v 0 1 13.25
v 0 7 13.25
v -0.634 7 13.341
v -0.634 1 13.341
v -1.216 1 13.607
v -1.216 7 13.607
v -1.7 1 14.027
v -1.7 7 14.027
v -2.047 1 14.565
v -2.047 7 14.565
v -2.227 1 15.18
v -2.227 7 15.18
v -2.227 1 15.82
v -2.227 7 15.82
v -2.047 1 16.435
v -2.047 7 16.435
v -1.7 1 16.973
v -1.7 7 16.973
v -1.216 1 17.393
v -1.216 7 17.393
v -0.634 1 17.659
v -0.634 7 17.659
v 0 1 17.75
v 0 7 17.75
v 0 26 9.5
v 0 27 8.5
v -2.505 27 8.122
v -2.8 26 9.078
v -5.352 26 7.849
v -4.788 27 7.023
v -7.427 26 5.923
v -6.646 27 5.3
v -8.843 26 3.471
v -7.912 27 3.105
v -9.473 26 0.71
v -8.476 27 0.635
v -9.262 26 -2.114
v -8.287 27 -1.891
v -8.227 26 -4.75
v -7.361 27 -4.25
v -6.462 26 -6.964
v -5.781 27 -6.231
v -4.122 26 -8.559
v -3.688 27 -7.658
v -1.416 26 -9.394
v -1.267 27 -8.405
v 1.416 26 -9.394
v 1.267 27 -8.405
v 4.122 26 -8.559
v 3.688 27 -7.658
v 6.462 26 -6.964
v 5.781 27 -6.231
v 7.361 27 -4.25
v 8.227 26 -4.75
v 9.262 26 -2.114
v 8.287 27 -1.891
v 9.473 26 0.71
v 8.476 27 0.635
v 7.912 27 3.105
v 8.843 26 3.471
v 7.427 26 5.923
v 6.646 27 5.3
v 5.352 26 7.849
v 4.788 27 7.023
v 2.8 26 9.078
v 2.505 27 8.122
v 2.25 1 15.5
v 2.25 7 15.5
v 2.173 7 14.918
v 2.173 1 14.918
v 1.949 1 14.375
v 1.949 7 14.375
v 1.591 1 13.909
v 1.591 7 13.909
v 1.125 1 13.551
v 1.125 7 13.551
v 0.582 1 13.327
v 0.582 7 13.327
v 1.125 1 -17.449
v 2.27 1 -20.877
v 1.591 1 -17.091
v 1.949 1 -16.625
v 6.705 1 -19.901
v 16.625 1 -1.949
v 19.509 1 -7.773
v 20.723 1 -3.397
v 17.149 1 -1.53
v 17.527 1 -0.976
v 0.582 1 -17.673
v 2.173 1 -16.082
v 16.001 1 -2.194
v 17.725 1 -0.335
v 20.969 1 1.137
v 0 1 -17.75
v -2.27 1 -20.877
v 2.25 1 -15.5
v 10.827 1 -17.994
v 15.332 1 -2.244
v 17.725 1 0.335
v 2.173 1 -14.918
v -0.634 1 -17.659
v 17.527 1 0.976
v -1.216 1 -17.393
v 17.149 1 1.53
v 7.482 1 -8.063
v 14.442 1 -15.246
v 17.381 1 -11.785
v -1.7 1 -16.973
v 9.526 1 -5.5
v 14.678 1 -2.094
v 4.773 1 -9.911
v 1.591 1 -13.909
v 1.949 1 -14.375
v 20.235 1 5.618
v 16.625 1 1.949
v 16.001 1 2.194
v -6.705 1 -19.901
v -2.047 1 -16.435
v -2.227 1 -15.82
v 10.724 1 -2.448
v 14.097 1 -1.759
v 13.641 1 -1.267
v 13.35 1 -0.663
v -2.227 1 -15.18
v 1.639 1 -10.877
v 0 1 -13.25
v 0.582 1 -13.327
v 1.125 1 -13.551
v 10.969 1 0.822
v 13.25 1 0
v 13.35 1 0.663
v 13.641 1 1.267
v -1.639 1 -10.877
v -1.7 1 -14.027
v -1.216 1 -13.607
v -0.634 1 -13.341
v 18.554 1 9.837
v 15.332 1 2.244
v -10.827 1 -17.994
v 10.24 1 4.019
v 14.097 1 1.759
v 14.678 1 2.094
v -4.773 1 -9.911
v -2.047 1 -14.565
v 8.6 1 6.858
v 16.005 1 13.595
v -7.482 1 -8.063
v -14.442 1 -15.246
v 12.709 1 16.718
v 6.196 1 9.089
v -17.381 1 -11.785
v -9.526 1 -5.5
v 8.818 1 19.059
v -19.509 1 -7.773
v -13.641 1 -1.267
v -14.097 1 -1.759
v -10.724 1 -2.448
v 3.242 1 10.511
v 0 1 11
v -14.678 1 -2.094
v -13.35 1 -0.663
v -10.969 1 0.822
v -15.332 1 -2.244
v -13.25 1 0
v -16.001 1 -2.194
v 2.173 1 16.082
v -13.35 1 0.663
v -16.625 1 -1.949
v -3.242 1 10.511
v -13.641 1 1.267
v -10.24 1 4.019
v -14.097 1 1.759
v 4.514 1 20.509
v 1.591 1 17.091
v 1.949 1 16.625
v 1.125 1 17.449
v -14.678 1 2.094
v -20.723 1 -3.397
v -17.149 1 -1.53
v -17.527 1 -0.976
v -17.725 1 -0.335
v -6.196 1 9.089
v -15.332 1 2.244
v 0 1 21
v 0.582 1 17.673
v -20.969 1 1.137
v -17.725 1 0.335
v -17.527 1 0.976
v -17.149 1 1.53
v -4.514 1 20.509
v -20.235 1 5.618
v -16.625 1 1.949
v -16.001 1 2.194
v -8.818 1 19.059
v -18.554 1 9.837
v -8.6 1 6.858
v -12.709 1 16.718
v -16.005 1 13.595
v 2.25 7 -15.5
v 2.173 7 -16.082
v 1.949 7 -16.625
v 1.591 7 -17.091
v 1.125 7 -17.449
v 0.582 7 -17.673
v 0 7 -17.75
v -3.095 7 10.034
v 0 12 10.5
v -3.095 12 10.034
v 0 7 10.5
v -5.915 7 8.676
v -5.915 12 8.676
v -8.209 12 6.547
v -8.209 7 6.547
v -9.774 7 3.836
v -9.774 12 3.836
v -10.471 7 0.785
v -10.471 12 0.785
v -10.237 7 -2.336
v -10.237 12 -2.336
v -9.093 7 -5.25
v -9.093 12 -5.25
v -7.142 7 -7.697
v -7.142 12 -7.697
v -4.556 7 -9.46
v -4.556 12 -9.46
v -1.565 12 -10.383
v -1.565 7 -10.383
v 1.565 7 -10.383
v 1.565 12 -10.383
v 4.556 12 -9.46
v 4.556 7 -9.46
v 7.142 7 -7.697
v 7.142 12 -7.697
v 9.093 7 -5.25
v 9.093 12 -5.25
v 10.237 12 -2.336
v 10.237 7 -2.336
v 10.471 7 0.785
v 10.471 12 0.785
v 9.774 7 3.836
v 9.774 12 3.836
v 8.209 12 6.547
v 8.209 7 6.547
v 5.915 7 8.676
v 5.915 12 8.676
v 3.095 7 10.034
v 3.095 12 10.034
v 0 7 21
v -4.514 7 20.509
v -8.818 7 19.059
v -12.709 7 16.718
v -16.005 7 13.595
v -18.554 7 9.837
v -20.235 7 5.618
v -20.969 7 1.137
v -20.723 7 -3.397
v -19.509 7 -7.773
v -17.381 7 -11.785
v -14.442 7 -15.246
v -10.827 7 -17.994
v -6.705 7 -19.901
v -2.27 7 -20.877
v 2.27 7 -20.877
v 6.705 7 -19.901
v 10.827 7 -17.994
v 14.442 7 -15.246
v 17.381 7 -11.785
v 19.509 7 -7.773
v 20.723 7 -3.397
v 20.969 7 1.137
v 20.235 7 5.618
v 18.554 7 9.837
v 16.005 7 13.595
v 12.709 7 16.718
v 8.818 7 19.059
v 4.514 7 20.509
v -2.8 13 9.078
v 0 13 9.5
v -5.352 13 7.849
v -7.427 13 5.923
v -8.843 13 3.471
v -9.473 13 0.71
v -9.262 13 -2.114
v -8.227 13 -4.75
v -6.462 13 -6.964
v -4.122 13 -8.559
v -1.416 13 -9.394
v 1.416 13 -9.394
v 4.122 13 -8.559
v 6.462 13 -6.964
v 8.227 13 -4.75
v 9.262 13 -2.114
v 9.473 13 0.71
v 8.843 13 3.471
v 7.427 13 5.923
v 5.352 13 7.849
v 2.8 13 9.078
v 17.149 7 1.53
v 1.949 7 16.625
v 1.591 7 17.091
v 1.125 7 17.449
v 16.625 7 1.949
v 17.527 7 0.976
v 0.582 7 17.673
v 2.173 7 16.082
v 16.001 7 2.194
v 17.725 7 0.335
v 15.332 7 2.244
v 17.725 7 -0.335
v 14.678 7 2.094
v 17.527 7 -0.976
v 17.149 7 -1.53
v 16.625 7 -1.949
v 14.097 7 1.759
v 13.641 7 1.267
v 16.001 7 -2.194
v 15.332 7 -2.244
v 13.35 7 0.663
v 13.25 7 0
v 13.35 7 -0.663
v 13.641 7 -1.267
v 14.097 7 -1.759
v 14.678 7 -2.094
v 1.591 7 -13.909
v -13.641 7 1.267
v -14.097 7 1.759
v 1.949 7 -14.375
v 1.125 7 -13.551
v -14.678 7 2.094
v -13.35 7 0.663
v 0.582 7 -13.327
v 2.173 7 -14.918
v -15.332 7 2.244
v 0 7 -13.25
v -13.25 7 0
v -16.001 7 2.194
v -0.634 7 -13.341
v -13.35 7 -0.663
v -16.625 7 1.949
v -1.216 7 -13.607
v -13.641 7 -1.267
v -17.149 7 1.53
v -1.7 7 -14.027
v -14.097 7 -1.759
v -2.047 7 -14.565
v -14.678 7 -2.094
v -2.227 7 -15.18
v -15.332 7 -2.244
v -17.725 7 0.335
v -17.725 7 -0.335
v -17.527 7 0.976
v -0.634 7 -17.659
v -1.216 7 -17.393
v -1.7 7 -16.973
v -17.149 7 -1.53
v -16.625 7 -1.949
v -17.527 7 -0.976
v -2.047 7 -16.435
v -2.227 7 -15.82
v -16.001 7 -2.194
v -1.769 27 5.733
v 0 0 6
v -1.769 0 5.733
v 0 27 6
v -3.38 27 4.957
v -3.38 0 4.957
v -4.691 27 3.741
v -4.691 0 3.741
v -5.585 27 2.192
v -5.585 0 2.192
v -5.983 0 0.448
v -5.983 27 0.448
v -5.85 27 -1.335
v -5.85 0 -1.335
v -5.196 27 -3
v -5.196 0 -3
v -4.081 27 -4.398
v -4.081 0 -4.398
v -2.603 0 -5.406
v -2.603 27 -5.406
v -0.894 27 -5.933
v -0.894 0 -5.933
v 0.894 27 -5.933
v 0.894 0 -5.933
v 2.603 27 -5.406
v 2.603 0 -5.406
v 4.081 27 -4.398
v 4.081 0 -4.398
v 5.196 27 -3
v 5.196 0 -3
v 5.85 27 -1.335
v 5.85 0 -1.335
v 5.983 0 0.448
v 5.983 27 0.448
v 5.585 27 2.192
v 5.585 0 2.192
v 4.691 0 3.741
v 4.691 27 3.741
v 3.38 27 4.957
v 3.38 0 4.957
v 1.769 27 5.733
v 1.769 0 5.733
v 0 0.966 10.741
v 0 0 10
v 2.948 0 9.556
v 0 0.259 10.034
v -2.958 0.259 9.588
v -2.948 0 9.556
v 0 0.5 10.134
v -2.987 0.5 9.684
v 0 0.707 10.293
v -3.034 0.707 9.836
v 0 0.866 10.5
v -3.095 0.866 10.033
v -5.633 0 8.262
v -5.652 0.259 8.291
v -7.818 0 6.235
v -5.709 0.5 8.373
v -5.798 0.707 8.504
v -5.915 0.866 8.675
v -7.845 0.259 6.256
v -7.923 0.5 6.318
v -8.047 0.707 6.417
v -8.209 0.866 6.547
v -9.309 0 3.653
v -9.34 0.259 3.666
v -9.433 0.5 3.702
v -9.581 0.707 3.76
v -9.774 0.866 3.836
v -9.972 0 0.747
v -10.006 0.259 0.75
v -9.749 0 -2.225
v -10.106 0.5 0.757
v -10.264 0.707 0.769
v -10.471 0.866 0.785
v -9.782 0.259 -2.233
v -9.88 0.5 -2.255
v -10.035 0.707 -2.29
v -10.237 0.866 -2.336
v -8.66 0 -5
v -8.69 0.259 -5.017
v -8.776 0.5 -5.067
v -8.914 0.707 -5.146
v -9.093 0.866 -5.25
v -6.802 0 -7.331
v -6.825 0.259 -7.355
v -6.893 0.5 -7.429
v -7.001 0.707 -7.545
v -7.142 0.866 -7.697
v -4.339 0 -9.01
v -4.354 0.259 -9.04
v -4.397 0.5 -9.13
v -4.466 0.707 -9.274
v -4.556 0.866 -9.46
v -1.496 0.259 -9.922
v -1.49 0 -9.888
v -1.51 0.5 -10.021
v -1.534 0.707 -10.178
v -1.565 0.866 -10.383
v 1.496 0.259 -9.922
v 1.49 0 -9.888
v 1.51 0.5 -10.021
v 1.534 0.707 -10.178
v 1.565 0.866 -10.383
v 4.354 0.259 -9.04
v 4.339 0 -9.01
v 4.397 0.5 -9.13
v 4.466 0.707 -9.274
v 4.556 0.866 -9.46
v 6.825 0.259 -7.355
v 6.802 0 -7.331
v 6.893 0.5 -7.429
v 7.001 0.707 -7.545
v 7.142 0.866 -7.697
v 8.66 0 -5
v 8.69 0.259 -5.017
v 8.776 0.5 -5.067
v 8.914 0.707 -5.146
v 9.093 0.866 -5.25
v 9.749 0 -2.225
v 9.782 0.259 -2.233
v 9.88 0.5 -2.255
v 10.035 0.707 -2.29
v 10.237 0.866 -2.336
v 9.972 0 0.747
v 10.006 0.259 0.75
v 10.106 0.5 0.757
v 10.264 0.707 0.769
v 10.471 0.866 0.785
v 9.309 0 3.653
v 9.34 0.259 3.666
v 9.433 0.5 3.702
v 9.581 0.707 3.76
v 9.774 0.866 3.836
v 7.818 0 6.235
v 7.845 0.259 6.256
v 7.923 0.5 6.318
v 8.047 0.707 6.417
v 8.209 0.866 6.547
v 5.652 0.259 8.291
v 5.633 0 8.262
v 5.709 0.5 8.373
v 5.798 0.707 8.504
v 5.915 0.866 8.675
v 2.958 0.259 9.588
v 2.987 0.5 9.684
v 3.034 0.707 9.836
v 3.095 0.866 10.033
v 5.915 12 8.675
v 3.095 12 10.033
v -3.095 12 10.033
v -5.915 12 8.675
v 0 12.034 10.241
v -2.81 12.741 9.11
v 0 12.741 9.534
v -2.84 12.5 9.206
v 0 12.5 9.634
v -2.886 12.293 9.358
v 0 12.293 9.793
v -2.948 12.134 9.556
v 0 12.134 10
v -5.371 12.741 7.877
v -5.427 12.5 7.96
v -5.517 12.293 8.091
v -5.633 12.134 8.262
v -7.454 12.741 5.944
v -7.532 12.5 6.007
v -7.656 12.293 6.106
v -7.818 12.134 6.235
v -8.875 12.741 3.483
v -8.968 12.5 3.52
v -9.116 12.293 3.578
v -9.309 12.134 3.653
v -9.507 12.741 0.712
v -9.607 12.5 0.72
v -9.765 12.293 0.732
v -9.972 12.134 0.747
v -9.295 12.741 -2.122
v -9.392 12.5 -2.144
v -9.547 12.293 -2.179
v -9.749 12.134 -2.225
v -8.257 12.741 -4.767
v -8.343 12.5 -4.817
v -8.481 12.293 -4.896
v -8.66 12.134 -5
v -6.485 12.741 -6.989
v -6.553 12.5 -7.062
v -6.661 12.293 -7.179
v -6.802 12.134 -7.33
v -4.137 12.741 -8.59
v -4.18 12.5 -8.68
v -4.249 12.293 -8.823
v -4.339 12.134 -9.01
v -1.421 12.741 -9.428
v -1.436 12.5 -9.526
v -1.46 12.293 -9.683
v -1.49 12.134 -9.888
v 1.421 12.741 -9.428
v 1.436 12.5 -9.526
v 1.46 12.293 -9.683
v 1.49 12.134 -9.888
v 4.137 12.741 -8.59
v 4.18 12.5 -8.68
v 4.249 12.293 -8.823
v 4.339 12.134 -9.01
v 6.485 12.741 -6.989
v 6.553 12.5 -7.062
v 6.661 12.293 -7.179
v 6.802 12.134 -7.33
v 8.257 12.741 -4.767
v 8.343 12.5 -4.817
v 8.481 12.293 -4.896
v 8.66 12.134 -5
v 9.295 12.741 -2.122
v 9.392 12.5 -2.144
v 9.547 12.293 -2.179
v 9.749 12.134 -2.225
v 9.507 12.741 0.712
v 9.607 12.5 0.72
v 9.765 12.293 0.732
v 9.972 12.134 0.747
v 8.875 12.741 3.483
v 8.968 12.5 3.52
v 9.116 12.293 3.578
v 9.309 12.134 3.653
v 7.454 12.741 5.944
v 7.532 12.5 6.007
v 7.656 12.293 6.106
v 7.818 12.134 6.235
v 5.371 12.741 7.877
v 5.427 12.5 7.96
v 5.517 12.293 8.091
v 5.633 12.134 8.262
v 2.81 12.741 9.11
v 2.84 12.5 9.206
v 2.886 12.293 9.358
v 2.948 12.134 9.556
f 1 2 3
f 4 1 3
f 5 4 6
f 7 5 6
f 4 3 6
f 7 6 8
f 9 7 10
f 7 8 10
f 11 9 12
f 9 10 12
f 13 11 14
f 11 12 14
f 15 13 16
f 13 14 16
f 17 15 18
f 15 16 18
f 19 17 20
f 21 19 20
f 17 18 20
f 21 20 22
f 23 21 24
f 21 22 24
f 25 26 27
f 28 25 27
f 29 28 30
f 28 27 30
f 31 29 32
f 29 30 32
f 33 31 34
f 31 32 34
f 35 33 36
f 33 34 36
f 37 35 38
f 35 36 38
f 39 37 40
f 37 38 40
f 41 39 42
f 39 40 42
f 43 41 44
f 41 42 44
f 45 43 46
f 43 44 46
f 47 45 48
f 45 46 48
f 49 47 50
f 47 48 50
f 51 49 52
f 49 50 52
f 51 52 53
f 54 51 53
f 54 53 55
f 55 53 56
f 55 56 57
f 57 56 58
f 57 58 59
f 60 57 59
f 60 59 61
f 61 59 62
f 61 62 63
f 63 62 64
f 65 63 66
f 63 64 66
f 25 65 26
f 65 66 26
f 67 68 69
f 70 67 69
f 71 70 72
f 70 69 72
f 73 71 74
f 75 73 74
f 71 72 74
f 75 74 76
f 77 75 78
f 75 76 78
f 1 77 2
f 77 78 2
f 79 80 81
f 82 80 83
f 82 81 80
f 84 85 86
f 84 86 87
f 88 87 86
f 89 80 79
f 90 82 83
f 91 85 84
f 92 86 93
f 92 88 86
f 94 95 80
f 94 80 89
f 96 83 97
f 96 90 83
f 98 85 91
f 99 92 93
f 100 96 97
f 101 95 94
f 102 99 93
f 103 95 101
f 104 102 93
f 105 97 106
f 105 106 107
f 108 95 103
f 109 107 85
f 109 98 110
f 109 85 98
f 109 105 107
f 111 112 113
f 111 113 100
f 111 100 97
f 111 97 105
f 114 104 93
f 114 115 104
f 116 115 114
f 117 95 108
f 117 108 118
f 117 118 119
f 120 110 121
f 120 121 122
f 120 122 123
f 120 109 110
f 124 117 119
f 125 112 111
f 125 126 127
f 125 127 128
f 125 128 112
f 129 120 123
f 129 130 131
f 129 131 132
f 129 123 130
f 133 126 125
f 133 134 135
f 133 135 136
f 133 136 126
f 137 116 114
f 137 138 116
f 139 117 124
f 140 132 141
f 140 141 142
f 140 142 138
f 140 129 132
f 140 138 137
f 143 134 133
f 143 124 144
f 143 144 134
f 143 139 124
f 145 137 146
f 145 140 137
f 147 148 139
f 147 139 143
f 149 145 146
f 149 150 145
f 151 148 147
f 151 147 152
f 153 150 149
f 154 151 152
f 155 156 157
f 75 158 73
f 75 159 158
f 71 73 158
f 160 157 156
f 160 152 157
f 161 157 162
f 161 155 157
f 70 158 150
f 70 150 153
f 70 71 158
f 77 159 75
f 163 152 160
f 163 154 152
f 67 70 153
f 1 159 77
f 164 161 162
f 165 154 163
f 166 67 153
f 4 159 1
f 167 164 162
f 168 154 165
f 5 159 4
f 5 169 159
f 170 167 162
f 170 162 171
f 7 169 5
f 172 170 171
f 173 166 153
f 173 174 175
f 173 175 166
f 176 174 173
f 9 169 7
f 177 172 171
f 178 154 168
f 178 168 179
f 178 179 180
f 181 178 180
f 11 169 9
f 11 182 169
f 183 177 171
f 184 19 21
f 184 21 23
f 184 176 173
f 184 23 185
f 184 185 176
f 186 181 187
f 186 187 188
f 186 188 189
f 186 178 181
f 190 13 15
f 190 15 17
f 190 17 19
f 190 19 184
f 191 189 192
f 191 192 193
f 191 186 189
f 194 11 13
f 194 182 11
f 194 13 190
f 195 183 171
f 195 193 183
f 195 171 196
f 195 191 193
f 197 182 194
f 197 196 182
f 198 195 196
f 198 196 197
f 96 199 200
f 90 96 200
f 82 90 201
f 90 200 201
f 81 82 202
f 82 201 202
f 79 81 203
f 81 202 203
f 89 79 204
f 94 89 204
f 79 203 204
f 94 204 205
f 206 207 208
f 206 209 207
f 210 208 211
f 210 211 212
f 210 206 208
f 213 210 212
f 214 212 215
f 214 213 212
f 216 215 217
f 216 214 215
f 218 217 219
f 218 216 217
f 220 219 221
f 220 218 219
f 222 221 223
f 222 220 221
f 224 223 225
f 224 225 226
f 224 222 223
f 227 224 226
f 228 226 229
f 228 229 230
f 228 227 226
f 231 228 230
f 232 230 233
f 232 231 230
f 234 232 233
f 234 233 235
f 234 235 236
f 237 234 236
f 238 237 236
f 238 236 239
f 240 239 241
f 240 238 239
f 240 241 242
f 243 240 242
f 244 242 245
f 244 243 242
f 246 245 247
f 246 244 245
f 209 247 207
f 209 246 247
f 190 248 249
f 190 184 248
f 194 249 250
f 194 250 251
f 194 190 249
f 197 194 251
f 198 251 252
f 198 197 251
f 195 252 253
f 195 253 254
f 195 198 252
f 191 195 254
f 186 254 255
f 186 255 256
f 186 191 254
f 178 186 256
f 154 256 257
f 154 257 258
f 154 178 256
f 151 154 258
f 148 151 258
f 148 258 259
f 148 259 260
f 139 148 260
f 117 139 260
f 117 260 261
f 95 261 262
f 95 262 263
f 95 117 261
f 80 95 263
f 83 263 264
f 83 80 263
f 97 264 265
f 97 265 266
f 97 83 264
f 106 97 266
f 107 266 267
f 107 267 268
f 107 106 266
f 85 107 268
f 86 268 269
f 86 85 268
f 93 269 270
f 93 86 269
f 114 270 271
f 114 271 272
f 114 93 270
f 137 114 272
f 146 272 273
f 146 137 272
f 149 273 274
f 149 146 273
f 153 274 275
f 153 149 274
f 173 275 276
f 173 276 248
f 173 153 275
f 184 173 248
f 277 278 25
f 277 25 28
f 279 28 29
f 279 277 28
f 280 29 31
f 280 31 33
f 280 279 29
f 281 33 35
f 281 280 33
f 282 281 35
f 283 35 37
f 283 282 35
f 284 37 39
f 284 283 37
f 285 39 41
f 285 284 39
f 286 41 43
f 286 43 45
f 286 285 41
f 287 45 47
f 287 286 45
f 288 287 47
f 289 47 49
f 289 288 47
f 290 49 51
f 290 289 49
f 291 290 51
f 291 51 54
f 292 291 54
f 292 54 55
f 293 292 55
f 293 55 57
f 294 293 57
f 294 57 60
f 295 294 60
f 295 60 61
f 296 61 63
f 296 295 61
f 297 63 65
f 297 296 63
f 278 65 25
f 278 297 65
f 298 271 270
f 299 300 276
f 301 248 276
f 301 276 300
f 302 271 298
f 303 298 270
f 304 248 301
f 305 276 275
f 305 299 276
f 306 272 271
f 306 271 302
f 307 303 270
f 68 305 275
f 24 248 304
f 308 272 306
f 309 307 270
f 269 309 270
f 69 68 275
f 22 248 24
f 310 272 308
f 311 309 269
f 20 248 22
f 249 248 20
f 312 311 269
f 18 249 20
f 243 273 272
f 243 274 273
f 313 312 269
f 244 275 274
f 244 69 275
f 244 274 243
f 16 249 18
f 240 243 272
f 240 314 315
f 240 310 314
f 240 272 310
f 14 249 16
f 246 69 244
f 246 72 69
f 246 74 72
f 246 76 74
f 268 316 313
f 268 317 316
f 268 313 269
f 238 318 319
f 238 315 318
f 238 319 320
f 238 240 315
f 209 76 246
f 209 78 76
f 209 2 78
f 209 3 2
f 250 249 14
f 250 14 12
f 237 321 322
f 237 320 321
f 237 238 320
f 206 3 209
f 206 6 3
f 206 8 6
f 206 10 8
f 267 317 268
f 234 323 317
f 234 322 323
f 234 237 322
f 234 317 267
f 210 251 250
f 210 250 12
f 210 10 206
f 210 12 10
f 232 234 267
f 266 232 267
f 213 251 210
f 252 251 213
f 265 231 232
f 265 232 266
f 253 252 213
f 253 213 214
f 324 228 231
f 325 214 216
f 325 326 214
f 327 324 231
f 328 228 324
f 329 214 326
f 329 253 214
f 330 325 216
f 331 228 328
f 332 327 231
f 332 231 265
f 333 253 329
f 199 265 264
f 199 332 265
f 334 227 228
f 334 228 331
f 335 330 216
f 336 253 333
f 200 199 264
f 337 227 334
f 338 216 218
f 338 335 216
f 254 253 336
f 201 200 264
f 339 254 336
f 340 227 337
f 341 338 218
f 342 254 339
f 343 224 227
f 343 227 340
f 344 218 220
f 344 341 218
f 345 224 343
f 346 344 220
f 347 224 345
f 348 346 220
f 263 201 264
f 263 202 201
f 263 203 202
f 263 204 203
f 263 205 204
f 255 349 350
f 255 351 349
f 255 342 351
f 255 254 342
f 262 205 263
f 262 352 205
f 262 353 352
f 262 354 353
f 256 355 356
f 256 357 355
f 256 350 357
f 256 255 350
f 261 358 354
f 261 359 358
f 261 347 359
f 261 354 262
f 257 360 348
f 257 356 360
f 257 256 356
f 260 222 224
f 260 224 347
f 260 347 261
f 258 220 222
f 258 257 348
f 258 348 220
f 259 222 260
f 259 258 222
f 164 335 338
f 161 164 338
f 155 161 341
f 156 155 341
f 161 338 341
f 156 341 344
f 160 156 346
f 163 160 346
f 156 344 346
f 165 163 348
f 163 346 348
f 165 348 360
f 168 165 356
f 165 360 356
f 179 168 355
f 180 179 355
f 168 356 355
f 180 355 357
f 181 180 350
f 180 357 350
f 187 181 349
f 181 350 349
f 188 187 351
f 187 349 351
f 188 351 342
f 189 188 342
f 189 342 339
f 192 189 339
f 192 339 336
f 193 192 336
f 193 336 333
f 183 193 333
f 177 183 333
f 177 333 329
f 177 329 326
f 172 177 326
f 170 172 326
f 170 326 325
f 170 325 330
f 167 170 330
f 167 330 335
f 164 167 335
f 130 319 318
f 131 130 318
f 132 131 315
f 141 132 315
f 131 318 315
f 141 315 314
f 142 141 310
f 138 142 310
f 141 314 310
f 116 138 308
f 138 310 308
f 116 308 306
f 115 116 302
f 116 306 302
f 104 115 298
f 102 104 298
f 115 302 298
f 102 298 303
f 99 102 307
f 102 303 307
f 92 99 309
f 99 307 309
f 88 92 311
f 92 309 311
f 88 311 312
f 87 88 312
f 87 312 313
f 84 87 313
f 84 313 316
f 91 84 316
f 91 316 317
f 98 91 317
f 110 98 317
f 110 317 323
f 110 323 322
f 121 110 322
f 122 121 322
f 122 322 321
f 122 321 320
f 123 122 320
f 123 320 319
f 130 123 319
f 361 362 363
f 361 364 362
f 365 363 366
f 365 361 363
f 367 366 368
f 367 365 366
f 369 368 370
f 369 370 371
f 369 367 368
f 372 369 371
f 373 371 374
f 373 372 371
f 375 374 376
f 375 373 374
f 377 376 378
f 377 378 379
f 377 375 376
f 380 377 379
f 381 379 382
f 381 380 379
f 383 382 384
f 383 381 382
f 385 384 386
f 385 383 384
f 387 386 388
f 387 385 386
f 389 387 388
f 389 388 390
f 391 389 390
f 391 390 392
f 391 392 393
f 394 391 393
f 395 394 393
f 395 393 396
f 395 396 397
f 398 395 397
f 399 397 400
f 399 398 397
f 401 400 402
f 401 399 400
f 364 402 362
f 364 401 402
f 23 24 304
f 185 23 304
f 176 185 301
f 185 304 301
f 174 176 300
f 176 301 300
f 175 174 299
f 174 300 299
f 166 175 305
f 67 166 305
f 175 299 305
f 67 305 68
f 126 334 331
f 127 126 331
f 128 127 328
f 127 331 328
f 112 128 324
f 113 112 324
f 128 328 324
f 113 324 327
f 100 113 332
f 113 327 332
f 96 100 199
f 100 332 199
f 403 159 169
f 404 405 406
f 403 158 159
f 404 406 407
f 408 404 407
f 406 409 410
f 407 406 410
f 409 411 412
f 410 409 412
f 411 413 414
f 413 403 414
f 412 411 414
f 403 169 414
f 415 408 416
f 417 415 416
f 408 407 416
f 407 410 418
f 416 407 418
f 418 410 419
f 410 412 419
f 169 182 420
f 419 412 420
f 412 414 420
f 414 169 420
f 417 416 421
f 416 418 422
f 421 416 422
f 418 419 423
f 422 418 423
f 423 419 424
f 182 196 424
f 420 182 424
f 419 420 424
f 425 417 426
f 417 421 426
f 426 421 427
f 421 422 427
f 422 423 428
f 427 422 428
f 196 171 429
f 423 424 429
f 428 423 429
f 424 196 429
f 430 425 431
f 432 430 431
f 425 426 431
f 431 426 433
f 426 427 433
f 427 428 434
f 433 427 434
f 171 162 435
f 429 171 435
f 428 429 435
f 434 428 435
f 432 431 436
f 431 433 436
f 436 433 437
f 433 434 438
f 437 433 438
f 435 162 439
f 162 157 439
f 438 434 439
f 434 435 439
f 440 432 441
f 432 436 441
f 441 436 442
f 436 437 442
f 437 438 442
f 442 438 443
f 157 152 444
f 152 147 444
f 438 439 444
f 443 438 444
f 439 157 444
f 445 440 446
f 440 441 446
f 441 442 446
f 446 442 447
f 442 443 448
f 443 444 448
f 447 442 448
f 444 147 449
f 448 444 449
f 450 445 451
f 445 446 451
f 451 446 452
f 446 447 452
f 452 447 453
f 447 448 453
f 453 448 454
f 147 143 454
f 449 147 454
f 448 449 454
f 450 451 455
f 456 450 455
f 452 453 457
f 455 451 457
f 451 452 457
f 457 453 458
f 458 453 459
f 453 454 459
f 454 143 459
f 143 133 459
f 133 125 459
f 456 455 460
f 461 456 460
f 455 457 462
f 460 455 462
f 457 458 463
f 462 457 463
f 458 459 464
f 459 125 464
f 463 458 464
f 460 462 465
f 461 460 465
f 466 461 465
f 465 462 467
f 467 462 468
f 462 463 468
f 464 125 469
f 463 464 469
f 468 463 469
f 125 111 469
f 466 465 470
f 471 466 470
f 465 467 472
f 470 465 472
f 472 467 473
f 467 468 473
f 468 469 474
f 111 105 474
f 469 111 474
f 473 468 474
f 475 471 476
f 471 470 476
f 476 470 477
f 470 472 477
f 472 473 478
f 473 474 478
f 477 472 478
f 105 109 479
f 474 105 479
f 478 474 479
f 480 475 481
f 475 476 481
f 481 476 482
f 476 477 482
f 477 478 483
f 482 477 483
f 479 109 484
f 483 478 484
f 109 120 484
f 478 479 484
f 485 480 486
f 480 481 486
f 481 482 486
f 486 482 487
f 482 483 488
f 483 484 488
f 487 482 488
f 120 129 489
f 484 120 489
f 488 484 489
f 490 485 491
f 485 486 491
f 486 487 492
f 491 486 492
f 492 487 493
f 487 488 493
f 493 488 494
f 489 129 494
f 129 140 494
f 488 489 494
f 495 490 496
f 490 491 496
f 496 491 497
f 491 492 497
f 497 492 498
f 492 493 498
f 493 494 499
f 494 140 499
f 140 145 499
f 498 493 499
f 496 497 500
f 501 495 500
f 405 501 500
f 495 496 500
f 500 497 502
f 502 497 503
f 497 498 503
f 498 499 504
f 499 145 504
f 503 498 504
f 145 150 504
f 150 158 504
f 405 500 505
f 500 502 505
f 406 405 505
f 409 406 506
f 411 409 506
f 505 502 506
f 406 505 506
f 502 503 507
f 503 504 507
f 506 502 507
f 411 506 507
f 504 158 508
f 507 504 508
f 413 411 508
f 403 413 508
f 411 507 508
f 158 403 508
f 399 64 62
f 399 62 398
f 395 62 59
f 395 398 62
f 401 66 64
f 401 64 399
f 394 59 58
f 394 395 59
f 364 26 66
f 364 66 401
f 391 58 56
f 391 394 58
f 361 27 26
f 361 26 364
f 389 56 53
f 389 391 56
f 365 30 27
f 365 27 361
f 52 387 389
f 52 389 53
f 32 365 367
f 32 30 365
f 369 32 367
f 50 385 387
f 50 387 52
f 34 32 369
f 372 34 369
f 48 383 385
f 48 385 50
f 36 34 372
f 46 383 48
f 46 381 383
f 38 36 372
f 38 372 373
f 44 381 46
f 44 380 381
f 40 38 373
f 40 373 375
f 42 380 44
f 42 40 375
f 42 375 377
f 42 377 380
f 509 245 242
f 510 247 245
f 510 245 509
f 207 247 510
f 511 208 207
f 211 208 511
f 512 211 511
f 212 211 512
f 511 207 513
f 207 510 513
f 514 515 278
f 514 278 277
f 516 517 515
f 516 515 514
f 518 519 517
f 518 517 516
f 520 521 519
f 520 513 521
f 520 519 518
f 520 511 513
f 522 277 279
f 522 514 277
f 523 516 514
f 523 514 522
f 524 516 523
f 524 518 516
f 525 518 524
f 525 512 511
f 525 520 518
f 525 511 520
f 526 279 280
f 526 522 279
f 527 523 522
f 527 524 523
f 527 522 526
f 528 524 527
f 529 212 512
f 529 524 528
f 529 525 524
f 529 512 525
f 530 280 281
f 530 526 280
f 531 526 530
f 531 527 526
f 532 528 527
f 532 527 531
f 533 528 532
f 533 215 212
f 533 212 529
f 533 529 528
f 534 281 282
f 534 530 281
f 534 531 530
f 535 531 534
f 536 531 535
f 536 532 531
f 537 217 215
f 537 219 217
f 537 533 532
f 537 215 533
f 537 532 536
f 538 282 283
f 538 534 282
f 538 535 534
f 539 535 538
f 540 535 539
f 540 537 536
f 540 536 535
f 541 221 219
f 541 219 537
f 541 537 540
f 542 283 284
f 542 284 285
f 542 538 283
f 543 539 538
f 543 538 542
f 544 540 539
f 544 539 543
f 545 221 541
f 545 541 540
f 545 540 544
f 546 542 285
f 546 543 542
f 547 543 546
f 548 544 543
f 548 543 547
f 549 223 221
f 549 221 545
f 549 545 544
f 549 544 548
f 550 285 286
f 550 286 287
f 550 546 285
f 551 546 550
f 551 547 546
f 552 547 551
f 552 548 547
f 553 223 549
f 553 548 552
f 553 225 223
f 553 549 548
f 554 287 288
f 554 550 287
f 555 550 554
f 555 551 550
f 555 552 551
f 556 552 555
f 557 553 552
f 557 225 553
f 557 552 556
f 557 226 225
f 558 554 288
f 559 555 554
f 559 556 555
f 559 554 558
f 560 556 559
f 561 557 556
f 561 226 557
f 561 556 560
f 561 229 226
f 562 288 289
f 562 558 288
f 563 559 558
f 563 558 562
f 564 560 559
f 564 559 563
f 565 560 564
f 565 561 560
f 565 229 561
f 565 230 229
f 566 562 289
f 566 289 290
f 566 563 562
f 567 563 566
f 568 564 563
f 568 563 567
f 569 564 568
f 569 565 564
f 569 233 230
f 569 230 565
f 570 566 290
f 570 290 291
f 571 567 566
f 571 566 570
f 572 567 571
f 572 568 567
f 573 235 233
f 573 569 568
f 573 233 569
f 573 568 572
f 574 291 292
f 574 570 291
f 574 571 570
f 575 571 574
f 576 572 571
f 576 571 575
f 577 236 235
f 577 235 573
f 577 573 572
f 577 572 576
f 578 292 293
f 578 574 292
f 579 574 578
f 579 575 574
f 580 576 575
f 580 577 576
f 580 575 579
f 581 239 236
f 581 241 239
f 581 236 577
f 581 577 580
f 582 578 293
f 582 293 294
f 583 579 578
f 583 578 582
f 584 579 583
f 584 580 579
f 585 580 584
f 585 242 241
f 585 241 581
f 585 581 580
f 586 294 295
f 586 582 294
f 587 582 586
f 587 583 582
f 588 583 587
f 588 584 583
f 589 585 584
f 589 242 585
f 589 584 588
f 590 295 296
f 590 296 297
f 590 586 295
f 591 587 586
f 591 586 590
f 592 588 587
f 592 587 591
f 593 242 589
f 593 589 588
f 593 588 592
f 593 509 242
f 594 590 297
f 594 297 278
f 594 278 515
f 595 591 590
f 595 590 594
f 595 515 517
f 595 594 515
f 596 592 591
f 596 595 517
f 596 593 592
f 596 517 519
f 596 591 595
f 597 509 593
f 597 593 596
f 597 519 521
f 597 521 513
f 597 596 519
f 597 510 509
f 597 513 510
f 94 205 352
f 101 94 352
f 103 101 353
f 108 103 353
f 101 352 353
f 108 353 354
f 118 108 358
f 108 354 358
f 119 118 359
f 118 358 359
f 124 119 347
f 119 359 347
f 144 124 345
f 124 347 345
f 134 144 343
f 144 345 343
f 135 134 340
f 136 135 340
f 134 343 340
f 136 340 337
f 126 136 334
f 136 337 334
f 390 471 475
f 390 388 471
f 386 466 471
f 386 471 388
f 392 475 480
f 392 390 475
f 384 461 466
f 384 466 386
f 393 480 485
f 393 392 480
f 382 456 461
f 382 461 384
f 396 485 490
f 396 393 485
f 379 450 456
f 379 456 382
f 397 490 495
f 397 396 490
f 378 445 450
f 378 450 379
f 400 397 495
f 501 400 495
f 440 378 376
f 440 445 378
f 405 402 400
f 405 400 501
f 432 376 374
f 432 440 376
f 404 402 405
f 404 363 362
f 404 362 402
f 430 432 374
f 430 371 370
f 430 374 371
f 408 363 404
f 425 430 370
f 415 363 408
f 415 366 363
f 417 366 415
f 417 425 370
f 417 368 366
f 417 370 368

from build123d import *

# Parameters (mm, degrees)
RACCORDO1_R              = 1
SMUSSO1_SIZE             = 1
RACCORDO2_R              = 1
TAGLIO_ESTRUSIONE1_DEPTH = 36.80502758


with BuildPart() as part:
    # Schizzo1 → Rivoluzione1 (revolve)
    with BuildSketch(Plane.XY, mode=Mode.PRIVATE) as rivoluzione1_sk:
        Polygon((10.5, 7), (21, 7), (21, 1), (10, 1), (10, 0), (6, 0), (6, 27), (9.5, 27), (9.5, 12), (10.5, 12), align=None)
    revolve(rivoluzione1_sk.sketch.rotate(Axis((0, 27, 0), (0, -1, 0)), 90), axis=Axis((0, 27, 0), (0, -1, 0)))

    # Raccordo1
    raccordo1_edges = [part.edges().sort_by_distance(p)[0] for p in [
        (0, 12, -9.5),
    ]]
    fillet(raccordo1_edges, radius=RACCORDO1_R - 0.0001)  # a hair under: the kernel refuses the full size

    # Smusso1
    smusso1_edges = [part.edges().sort_by_distance(p)[0] for p in [
        (0, 27, -9.5),
    ]]
    chamfer(smusso1_edges, length=SMUSSO1_SIZE)

    # Raccordo2
    raccordo2_edges = [part.edges().sort_by_distance(p)[0] for p in [
        (0, 1, -10),
    ]]
    fillet(raccordo2_edges, radius=RACCORDO2_R - 0.0001)  # a hair under: the kernel refuses the full size

    # Schizzo2 → Taglio-Estrusione1 (cut, through all)
    with BuildSketch(Plane(origin=(0, 7, 0), x_dir=(1, 0, 0), z_dir=(0, 1, 0))):
        with BuildLine():
            ThreePointArc((2.25, 15.5), (1.590990258, 17.090990258), (0, 17.75))
            Line((0, 17.75), (0, 13.25))
            ThreePointArc((0, 13.25), (1.590990258, 13.909009742), (2.25, 15.5))
        make_face()
        with BuildLine():
            Line((0, 13.25), (0, 17.75))
            ThreePointArc((0, 17.75), (-2.25, 15.5), (0, 13.25))
        make_face()
        with BuildLine():
            ThreePointArc((17.75, 0), (15.5, 2.25), (13.25, 0))
            Line((13.25, 0), (17.75, 0))
        make_face()
        with BuildLine():
            Line((17.75, 0), (13.25, 0))
            ThreePointArc((13.25, 0), (15.5, -2.25), (17.75, 0))
        make_face()
        with BuildLine():
            ThreePointArc((2.25, -15.5), (1.590990258, -13.909009742), (0, -13.25))
            Line((0, -13.25), (0, -17.75))
            ThreePointArc((0, -17.75), (1.590990258, -17.090990258), (2.25, -15.5))
        make_face()
        with BuildLine():
            Line((0, -17.75), (0, -13.25))
            ThreePointArc((0, -13.25), (-2.25, -15.5), (0, -17.75))
        make_face()
        with BuildLine():
            ThreePointArc((-17.75, 0), (-15.5, -2.25), (-13.25, 0))
            Line((-13.25, 0), (-17.75, 0))
        make_face()
        with BuildLine():
            Line((-17.75, 0), (-13.25, 0))
            ThreePointArc((-13.25, 0), (-15.5, 2.25), (-17.75, 0))
        make_face()
    extrude(amount=-TAGLIO_ESTRUSIONE1_DEPTH, mode=Mode.SUBTRACT)


solid = part.part
